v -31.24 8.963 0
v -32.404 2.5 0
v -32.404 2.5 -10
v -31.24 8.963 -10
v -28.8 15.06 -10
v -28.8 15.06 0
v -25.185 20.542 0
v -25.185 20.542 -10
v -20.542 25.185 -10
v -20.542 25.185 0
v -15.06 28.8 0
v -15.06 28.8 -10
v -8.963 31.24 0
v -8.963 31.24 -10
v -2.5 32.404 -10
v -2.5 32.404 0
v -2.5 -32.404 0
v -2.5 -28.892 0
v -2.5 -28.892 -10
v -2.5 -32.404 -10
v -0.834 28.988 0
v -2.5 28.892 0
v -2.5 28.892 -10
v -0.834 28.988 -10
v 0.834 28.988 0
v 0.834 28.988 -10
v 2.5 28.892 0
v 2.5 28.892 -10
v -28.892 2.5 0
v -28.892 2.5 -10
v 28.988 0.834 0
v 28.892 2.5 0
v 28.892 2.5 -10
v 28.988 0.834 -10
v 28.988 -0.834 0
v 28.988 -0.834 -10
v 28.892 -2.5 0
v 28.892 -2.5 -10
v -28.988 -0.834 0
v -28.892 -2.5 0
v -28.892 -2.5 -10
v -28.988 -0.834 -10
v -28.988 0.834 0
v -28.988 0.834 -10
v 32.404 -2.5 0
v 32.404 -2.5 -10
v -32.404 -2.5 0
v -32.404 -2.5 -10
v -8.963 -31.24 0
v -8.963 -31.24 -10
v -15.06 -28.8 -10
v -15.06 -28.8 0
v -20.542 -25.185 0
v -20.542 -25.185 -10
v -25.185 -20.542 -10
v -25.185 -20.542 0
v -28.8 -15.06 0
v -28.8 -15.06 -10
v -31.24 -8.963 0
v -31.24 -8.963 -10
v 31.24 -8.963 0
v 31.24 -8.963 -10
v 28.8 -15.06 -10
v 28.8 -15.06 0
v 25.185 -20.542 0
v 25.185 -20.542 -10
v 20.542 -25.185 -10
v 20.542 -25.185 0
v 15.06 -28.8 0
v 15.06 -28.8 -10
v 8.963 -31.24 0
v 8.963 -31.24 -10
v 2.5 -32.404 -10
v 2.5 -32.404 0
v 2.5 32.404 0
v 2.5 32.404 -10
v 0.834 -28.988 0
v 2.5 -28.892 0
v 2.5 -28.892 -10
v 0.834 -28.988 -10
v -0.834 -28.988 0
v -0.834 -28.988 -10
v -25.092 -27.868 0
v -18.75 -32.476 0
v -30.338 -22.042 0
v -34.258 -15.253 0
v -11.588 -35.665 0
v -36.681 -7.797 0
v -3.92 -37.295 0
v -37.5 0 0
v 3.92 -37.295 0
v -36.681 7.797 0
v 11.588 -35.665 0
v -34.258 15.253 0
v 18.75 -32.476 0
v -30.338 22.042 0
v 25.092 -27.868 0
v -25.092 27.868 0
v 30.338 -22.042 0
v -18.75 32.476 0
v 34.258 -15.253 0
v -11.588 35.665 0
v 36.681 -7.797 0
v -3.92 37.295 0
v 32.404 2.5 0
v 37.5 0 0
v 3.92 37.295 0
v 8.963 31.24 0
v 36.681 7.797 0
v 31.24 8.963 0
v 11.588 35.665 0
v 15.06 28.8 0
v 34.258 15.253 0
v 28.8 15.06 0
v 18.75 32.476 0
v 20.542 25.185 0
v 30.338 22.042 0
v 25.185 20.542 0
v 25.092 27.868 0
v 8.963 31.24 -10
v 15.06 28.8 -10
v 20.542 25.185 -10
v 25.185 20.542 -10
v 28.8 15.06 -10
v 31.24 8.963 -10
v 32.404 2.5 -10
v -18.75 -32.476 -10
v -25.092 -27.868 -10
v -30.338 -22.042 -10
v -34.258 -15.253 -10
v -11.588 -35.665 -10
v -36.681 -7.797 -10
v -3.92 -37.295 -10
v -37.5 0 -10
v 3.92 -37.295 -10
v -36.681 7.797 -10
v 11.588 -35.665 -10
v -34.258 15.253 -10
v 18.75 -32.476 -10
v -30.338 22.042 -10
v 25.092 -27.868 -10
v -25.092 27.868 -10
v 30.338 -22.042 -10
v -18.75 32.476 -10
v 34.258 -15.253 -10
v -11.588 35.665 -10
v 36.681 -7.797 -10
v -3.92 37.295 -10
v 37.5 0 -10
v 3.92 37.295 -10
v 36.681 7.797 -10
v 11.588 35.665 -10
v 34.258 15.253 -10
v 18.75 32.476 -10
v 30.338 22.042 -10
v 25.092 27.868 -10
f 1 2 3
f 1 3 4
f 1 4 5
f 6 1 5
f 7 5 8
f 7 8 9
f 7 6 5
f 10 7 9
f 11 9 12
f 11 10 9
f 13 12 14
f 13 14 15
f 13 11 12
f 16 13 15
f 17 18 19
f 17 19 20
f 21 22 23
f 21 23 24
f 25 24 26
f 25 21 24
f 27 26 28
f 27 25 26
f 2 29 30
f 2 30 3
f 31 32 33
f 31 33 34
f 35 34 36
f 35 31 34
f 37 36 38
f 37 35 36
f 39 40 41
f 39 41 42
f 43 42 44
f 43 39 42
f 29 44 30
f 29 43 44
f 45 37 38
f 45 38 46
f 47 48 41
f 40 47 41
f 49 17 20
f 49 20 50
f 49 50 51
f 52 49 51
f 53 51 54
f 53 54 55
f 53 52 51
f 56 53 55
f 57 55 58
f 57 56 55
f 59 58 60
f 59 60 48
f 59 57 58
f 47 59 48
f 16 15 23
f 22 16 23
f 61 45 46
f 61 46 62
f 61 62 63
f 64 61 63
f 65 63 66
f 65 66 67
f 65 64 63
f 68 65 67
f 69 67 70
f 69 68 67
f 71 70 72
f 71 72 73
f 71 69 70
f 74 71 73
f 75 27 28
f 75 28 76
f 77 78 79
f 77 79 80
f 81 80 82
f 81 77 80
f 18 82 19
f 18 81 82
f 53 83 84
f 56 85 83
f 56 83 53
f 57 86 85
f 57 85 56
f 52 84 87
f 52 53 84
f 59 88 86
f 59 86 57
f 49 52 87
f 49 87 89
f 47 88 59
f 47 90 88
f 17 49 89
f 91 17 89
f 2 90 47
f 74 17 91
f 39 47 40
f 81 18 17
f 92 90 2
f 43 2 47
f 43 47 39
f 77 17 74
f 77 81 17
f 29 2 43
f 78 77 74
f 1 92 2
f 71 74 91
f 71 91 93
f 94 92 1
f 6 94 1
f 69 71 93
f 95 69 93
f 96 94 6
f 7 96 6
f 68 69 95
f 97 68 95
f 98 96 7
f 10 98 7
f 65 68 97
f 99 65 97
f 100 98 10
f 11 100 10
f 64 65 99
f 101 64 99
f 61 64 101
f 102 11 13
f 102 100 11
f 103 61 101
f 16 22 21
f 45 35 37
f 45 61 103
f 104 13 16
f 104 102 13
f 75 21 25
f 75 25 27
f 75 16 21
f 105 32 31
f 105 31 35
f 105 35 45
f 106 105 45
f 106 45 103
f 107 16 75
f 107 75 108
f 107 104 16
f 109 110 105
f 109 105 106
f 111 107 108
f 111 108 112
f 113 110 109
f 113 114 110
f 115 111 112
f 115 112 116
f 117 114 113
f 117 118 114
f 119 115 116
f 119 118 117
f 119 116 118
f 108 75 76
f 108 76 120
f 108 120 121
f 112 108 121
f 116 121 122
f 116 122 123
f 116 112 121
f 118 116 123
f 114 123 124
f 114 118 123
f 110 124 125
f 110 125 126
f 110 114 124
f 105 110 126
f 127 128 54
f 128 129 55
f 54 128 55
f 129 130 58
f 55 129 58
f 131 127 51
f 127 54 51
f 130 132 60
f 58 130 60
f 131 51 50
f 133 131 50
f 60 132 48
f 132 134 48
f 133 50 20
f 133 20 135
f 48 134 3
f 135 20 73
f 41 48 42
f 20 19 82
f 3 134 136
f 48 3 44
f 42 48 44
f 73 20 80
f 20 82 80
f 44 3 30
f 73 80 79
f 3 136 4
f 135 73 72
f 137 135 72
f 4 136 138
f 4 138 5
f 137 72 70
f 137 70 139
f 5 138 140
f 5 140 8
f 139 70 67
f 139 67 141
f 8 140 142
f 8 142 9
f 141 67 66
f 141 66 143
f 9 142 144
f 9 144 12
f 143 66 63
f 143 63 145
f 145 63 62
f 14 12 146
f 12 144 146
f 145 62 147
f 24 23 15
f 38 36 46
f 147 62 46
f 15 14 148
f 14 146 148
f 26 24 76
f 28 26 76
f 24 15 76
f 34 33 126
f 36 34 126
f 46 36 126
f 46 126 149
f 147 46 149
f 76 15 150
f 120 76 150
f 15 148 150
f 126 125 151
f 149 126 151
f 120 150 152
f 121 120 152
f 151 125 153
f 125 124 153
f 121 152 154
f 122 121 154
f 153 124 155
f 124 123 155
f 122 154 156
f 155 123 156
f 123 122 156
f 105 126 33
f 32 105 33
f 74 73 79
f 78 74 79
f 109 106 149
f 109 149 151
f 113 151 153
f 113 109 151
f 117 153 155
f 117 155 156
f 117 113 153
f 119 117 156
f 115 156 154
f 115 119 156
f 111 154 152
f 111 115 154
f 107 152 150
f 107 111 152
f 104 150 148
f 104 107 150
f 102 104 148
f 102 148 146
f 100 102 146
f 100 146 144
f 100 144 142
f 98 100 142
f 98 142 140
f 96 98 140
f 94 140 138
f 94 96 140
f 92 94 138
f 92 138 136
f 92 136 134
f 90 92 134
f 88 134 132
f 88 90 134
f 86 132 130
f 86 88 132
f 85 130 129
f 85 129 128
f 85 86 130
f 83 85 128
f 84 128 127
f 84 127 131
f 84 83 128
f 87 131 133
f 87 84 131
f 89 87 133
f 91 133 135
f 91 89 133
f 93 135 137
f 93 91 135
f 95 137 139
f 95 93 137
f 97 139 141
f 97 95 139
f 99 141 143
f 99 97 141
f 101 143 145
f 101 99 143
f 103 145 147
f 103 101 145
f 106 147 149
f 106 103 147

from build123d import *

# Parameters (mm, degrees)
F0_R     = 37.5
F1_DEPTH = 10


with BuildPart() as f1:
    # F0 (on Top) → F1 (new body)
    with BuildSketch(Plane.XY):
        Circle(F0_R)
        with BuildLine():
            ThreePointArc((32.403703, 2.5), (32.475917, 1.250927), (32.5, 0))
            ThreePointArc((32.5, 0), (32.475917, -1.250927), (32.403703, -2.5))
            ThreePointArc((32.403703, -2.5), (22.98097, -22.98097), (2.5, -32.403703))
            ThreePointArc((2.5, -32.403703), (0, -32.5), (-2.5, -32.403703))
            ThreePointArc((-2.5, -32.403703), (-22.98097, -22.98097), (-32.403703, -2.5))
            ThreePointArc((-32.403703, -2.5), (-32.5, 0), (-32.403703, 2.5))
            ThreePointArc((-32.403703, 2.5), (-22.98097, 22.98097), (-2.5, 32.403703))
            ThreePointArc((-2.5, 32.403703), (0, 32.5), (2.5, 32.403703))
            ThreePointArc((2.5, 32.403703), (22.98097, 22.98097), (32.403703, 2.5))
        make_face(mode=Mode.SUBTRACT)
        with BuildLine():
            Line((2.5, 28.89204), (2.5, 32.403703))
            ThreePointArc((2.5, 32.403703), (0, 32.5), (-2.5, 32.403703))
            Line((-2.5, 32.403703), (-2.5, 28.89204))
            ThreePointArc((-2.5, 28.89204), (0, 29), (2.5, 28.89204))
        make_face()
        with BuildLine():
            ThreePointArc((32.403703, -2.5), (32.475917, -1.250927), (32.5, 0))
            ThreePointArc((32.5, 0), (32.475917, 1.250927), (32.403703, 2.5))
            Line((32.403703, 2.5), (28.89204, 2.5))
            ThreePointArc((28.89204, 2.5), (29, 0), (28.89204, -2.5))
            Line((28.89204, -2.5), (32.403703, -2.5))
        make_face()
        with BuildLine():
            ThreePointArc((-2.5, -32.403703), (0, -32.5), (2.5, -32.403703))
            Line((2.5, -32.403703), (2.5, -28.89204))
            ThreePointArc((2.5, -28.89204), (0, -29), (-2.5, -28.89204))
            Line((-2.5, -28.89204), (-2.5, -32.403703))
        make_face()
        with BuildLine():
            Line((-28.89204, 2.5), (-32.403703, 2.5))
            ThreePointArc((-32.403703, 2.5), (-32.5, 0), (-32.403703, -2.5))
            Line((-32.403703, -2.5), (-28.89204, -2.5))
            ThreePointArc((-28.89204, -2.5), (-29, 0), (-28.89204, 2.5))
        make_face()
    extrude(amount=-F1_DEPTH)


solid = f1.part
